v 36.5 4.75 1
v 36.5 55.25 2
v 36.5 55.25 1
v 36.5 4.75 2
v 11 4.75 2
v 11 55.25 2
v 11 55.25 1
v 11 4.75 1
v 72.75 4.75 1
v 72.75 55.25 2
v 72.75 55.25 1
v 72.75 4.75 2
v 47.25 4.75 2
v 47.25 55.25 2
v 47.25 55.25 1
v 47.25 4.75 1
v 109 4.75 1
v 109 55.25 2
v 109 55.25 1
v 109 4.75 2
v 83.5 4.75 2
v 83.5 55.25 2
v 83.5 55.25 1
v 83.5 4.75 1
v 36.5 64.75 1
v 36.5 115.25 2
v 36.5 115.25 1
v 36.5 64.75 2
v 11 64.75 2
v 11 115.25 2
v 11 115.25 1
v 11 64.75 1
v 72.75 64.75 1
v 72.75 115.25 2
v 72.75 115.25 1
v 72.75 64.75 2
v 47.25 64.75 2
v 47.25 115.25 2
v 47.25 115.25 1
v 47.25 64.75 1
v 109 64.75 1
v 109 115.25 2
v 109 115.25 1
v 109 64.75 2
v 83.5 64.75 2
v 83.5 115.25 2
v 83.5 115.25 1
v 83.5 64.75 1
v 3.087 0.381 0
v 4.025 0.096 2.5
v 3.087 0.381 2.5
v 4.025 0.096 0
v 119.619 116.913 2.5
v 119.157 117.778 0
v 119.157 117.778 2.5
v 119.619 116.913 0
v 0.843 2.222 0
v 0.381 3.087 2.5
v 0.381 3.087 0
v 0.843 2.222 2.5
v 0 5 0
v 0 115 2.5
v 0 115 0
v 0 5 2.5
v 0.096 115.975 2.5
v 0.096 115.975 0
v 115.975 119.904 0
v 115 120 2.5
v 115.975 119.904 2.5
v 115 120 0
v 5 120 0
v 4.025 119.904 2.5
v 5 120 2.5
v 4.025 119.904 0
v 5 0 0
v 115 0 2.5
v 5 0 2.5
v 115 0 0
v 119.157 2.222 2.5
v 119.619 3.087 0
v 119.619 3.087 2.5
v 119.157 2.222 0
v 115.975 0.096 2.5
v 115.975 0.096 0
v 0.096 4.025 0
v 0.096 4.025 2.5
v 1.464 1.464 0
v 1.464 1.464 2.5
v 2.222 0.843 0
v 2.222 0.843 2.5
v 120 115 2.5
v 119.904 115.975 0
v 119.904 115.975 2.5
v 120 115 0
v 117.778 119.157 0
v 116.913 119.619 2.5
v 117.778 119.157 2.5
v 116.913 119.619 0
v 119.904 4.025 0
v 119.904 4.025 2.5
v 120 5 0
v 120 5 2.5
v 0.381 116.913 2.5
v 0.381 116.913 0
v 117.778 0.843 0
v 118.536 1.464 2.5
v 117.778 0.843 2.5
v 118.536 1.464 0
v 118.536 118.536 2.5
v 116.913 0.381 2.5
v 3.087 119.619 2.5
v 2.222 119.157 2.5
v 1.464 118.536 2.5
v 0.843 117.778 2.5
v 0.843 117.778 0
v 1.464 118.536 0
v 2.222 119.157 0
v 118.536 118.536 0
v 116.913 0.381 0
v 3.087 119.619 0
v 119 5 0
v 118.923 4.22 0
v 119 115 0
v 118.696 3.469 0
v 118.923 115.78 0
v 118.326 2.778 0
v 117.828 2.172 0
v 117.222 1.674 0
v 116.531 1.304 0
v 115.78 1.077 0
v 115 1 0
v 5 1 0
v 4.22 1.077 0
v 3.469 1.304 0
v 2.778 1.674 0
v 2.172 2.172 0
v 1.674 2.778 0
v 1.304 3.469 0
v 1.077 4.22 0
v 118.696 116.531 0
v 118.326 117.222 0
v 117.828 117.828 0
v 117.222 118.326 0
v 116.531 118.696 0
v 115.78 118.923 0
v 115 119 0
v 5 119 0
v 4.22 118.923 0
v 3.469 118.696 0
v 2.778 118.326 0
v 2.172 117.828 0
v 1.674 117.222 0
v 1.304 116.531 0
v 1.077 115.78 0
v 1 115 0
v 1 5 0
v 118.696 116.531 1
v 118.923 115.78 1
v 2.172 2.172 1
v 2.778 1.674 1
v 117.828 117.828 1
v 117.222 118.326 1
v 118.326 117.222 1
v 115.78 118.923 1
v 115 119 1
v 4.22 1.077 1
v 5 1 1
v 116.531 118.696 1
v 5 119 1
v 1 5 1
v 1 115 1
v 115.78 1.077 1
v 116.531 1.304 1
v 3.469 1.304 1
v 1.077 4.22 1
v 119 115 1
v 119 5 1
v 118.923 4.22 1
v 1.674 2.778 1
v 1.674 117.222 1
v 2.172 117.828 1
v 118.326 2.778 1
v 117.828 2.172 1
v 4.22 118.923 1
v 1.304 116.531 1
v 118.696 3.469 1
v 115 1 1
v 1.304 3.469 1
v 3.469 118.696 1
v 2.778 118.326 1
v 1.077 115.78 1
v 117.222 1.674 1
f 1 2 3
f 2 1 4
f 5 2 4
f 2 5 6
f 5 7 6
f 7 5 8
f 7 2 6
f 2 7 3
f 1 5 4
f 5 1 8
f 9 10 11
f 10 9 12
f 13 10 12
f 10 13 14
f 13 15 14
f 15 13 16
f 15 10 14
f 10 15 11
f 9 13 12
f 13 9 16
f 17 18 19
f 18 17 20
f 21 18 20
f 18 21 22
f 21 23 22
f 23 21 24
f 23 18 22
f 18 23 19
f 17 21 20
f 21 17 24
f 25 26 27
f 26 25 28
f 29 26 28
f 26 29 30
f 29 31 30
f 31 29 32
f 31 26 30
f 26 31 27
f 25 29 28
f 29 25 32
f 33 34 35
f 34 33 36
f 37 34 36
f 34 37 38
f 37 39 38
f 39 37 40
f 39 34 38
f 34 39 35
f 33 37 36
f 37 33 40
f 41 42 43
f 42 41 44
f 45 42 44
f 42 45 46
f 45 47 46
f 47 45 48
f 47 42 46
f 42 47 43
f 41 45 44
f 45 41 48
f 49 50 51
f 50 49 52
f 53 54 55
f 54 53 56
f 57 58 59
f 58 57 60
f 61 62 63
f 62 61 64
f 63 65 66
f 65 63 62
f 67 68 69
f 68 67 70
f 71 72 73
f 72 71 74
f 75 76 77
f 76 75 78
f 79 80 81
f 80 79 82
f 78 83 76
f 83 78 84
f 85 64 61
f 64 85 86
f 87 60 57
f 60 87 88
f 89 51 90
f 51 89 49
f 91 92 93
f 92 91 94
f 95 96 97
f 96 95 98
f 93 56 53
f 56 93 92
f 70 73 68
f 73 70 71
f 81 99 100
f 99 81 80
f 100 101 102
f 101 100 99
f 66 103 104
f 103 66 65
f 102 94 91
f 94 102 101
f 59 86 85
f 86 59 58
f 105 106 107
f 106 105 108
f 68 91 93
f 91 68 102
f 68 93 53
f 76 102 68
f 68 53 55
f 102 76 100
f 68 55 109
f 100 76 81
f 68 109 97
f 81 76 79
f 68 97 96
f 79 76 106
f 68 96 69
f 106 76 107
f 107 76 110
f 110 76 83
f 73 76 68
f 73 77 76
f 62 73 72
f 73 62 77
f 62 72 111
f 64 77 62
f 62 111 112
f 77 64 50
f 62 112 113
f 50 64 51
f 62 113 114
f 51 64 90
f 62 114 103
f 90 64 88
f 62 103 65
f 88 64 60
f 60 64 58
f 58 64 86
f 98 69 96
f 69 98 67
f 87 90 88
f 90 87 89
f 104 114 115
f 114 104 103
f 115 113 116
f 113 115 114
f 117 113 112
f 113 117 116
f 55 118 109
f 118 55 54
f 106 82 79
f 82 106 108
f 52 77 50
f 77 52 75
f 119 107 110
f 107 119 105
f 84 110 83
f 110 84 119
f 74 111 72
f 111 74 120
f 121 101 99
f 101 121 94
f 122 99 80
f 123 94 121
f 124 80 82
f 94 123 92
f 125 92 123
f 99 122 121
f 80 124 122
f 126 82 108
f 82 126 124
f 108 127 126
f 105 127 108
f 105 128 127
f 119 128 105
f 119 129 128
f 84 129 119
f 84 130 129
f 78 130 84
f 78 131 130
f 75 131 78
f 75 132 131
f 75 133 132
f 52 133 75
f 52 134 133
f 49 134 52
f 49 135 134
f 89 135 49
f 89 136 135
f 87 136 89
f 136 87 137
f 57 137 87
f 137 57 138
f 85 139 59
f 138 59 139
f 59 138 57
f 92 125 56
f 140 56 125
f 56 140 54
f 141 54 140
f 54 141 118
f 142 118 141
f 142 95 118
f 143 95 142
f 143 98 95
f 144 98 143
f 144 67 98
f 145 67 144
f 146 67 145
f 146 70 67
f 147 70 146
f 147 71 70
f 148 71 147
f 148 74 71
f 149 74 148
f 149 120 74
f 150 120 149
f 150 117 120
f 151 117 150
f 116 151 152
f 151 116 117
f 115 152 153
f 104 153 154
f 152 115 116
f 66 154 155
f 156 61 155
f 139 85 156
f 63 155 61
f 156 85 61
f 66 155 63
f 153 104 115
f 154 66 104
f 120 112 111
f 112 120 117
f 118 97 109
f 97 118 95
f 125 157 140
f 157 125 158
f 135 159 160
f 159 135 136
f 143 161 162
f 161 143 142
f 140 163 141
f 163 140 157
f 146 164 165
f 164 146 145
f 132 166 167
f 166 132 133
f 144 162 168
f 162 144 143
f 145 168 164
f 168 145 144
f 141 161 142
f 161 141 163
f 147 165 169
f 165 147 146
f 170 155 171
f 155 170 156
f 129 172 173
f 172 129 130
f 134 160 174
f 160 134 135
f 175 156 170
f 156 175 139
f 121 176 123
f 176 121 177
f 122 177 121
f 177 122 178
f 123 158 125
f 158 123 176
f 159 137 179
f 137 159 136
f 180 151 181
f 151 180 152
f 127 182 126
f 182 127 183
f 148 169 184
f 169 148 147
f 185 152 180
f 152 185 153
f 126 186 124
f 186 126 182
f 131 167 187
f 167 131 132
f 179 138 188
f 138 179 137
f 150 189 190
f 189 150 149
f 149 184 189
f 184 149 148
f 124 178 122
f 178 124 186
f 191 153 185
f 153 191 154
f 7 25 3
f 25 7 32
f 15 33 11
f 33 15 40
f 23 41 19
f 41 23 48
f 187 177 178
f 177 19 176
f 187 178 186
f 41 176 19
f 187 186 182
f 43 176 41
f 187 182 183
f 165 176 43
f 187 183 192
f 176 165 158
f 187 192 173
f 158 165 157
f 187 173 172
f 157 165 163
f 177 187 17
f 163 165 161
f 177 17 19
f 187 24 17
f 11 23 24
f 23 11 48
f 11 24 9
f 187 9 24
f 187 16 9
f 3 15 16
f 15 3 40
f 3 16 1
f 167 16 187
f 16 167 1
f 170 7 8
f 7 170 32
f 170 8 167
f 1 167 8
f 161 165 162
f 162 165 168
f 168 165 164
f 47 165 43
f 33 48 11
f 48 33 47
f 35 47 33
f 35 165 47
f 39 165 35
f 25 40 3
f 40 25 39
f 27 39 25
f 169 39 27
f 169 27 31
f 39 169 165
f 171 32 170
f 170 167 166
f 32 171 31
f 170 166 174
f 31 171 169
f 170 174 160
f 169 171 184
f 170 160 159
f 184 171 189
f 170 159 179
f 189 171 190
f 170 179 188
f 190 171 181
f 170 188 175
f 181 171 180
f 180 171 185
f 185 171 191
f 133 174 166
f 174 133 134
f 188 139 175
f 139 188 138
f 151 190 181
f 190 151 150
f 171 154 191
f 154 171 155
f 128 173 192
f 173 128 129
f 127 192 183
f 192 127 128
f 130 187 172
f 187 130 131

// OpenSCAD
base_width=25;
base_extra_spacing=0.5;
base_depth=1.5;
min_size=150;
max_size=200;
squad_spacing=5;

ten_man_tray_width=120;
ten_man_tray_depth=90;
ten_man_tray_corner_radius=5;
// Flat gap between socket edges on the tray (same idea as squad_spacing).
ten_man_socket_spacing=5;
skirmisher_tray_width=120;
skirmisher_tray_depth=60;
heavy_riders_tray_size=120;
// 25x50mm cavalry bases. Four files fit the 120mm width.
heavy_rider_base_length=50;
heavy_riders_per_rank=4;
heavy_rider_rank_gap=10;
$fn=180;

// squad_base(8, 4, false);
// tenManBase();
// skirmisherBase();
heavyRidersBase(6);

module squad_base(
  squad_size,
  per_row=6,
  skip=true,
  corner_radius=ten_man_tray_corner_radius
) {
  actual_size = skip ? squad_size * 2 : squad_size;
  actual_per_row = skip ? per_row * 2 : per_row;

  num_rows = ceil(actual_size / actual_per_row);
  actual_cols = min(actual_size, actual_per_row);

  // Include equal margin (squad_spacing) around the grid on all sides
  squad_width = actual_cols * base_width + (actual_cols + 1) * squad_spacing;
  squad_length = num_rows * base_width + (num_rows + 1) * squad_spacing;

  difference() {
    tray_plate(squad_width, squad_length, corner_radius, base_depth + 1);

    translate([1, 1, -1.5])
    tray_plate(
      squad_width - 2,
      squad_length - 2,
      max(corner_radius - 1, 1),
      base_depth + 1
    );
    translate([0, 0, 0.5])
    for (row = [0:num_rows-1]) {
      // Handle partial final row
      cols_in_row = min(actual_per_row, actual_size - row * actual_per_row);
      row_pos = squad_spacing + base_width/2 + row * (base_width + squad_spacing);
      translate([0, row_pos, 0])
      for (col = [0:cols_in_row-1]) {
        if(!skip || !should_skip(row, col)) {
          col_pos = squad_spacing + base_width/2 + col * (base_width + squad_spacing);
          translate([col_pos, 0, 0])
          cylinder(h=base_depth, d=base_width + base_extra_spacing);
        }
      }
    }
  }
}

function should_skip(row, col) = (row + col) % 2 == 0;

// Warrior unit: 10 models on 25mm bases, 3-4-3 hex stagger on a 120x90mm tray.
module tenManBase(
  width=ten_man_tray_width,
  depth=ten_man_tray_depth,
  corner_radius=ten_man_tray_corner_radius,
  socket_spacing=ten_man_socket_spacing
) {
  pitch = base_width + socket_spacing;
  row_dy = sqrt(pitch * pitch - (pitch / 2) * (pitch / 2));
  y0 = (depth - base_width - 2 * row_dy) / 2 + base_width / 2;
  x4 = (width - 3 * pitch) / 2;
  x3 = x4 + pitch / 2;

  difference() {
    tray_plate(width, depth, corner_radius, base_depth + 1);

    translate([1, 1, -1.5])
    tray_plate(
      width - 2,
      depth - 2,
      max(corner_radius - 1, 1),
      base_depth + 1
    );

    translate([0, 0, 0.5])
    union() {
      ten_man_row(x3, y0, pitch, 3);
      ten_man_row(x4, y0 + row_dy, pitch, 4);
      ten_man_row(x3, y0 + 2 * row_dy, pitch, 3);
    }
  }
}

// Skirmisher unit: 4 models on 25mm bases, loose stagger on a 120x60mm tray.
// Centers match the unit diagram (origin at the front-left corner):
// (15, 28), (45, 34), (75, 25), (105, 30).
module skirmisherBase(
  width=skirmisher_tray_width,
  depth=skirmisher_tray_depth,
  corner_radius=ten_man_tray_corner_radius,
  socket_spacing=ten_man_socket_spacing
) {
  pitch = base_width + socket_spacing;
  x0 = (width - 3 * pitch) / 2;
  // Offsets from the depth centerline, left to right.
  y_offsets = [-2, 4, -5, 0];

  difference() {
    tray_plate(width, depth, corner_radius, base_depth + 1);

    translate([1, 1, -1.5])
    tray_plate(
      width - 2,
      depth - 2,
      max(corner_radius - 1, 1),
      base_depth + 1
    );

    translate([0, 0, 0.5])
    for (i = [0:len(y_offsets) - 1])
      translate([x0 + i * pitch, depth / 2 + y_offsets[i], 0])
      cylinder(h=base_depth, d=base_width + base_extra_spacing);
  }
}

// Heavy Riders: 25x50mm bases on a fixed 120x120mm tray.
// The full unit is 4 files by 2 ranks. Fewer slots keep two ranks,
// split as evenly as possible with the extra socket on the front rank.
// Each rank spreads across the full tray width: the side margins equal
// the gaps between bases, and that gap grows as the rank gets shorter.
module heavyRidersBase(
  slots=8,
  corner_radius=ten_man_tray_corner_radius
) {
  width = heavy_riders_tray_size;
  depth = heavy_riders_tray_size;
  assert(slots >= 1 && slots <= heavy_riders_per_rank * 2);

  rank_count = slots == 1 ? 1 : 2;
  front_count = ceil(slots / rank_count);
  back_count = slots - front_count;

  margin_y = (depth - 2 * heavy_rider_base_length - heavy_rider_rank_gap) / 2;
  y_front = margin_y + heavy_rider_base_length / 2;
  y_back = y_front + heavy_rider_base_length + heavy_rider_rank_gap;

  difference() {
    tray_plate(width, depth, corner_radius, base_depth + 1);

    translate([1, 1, -1.5])
    tray_plate(
      width - 2,
      depth - 2,
      max(corner_radius - 1, 1),
      base_depth + 1
    );

    translate([0, 0, 0.5])
    union() {
      heavy_rider_rank(front_count, rank_count == 1 ? depth / 2 : y_front);
      if (back_count > 0)
        heavy_rider_rank(back_count, y_back);
    }
  }
}

module heavy_rider_rank(count, y) {
  // count + 1 gaps: both side margins and the space between each base.
  gap = (heavy_riders_tray_size - count * base_width) / (count + 1);
  x0 = gap + base_width / 2;
  slot_w = base_width + base_extra_spacing;
  slot_l = heavy_rider_base_length + base_extra_spacing;

  for (col = [0:count - 1])
    translate([x0 + col * (base_width + gap), y, base_depth / 2])
    cube([slot_w, slot_l, base_depth], center=true);
}

module ten_man_row(x_start, y, pitch, count) {
  for (col = [0:count - 1]) {
    translate([x_start + col * pitch, y, 0])
    cylinder(h=base_depth, d=base_width + base_extra_spacing);
  }
}

module tray_plate(width, depth, corner_radius, height) {
  linear_extrude(height)
  rounded_rect(width, depth, corner_radius);
}

module rounded_rect(width, depth, radius) {
  r = min(radius, width / 2 - 0.01, depth / 2 - 0.01);
  translate([r, r, 0])
  minkowski() {
    square([width - 2 * r, depth - 2 * r]);
    circle(r=r, $fn=32);
  }
}
